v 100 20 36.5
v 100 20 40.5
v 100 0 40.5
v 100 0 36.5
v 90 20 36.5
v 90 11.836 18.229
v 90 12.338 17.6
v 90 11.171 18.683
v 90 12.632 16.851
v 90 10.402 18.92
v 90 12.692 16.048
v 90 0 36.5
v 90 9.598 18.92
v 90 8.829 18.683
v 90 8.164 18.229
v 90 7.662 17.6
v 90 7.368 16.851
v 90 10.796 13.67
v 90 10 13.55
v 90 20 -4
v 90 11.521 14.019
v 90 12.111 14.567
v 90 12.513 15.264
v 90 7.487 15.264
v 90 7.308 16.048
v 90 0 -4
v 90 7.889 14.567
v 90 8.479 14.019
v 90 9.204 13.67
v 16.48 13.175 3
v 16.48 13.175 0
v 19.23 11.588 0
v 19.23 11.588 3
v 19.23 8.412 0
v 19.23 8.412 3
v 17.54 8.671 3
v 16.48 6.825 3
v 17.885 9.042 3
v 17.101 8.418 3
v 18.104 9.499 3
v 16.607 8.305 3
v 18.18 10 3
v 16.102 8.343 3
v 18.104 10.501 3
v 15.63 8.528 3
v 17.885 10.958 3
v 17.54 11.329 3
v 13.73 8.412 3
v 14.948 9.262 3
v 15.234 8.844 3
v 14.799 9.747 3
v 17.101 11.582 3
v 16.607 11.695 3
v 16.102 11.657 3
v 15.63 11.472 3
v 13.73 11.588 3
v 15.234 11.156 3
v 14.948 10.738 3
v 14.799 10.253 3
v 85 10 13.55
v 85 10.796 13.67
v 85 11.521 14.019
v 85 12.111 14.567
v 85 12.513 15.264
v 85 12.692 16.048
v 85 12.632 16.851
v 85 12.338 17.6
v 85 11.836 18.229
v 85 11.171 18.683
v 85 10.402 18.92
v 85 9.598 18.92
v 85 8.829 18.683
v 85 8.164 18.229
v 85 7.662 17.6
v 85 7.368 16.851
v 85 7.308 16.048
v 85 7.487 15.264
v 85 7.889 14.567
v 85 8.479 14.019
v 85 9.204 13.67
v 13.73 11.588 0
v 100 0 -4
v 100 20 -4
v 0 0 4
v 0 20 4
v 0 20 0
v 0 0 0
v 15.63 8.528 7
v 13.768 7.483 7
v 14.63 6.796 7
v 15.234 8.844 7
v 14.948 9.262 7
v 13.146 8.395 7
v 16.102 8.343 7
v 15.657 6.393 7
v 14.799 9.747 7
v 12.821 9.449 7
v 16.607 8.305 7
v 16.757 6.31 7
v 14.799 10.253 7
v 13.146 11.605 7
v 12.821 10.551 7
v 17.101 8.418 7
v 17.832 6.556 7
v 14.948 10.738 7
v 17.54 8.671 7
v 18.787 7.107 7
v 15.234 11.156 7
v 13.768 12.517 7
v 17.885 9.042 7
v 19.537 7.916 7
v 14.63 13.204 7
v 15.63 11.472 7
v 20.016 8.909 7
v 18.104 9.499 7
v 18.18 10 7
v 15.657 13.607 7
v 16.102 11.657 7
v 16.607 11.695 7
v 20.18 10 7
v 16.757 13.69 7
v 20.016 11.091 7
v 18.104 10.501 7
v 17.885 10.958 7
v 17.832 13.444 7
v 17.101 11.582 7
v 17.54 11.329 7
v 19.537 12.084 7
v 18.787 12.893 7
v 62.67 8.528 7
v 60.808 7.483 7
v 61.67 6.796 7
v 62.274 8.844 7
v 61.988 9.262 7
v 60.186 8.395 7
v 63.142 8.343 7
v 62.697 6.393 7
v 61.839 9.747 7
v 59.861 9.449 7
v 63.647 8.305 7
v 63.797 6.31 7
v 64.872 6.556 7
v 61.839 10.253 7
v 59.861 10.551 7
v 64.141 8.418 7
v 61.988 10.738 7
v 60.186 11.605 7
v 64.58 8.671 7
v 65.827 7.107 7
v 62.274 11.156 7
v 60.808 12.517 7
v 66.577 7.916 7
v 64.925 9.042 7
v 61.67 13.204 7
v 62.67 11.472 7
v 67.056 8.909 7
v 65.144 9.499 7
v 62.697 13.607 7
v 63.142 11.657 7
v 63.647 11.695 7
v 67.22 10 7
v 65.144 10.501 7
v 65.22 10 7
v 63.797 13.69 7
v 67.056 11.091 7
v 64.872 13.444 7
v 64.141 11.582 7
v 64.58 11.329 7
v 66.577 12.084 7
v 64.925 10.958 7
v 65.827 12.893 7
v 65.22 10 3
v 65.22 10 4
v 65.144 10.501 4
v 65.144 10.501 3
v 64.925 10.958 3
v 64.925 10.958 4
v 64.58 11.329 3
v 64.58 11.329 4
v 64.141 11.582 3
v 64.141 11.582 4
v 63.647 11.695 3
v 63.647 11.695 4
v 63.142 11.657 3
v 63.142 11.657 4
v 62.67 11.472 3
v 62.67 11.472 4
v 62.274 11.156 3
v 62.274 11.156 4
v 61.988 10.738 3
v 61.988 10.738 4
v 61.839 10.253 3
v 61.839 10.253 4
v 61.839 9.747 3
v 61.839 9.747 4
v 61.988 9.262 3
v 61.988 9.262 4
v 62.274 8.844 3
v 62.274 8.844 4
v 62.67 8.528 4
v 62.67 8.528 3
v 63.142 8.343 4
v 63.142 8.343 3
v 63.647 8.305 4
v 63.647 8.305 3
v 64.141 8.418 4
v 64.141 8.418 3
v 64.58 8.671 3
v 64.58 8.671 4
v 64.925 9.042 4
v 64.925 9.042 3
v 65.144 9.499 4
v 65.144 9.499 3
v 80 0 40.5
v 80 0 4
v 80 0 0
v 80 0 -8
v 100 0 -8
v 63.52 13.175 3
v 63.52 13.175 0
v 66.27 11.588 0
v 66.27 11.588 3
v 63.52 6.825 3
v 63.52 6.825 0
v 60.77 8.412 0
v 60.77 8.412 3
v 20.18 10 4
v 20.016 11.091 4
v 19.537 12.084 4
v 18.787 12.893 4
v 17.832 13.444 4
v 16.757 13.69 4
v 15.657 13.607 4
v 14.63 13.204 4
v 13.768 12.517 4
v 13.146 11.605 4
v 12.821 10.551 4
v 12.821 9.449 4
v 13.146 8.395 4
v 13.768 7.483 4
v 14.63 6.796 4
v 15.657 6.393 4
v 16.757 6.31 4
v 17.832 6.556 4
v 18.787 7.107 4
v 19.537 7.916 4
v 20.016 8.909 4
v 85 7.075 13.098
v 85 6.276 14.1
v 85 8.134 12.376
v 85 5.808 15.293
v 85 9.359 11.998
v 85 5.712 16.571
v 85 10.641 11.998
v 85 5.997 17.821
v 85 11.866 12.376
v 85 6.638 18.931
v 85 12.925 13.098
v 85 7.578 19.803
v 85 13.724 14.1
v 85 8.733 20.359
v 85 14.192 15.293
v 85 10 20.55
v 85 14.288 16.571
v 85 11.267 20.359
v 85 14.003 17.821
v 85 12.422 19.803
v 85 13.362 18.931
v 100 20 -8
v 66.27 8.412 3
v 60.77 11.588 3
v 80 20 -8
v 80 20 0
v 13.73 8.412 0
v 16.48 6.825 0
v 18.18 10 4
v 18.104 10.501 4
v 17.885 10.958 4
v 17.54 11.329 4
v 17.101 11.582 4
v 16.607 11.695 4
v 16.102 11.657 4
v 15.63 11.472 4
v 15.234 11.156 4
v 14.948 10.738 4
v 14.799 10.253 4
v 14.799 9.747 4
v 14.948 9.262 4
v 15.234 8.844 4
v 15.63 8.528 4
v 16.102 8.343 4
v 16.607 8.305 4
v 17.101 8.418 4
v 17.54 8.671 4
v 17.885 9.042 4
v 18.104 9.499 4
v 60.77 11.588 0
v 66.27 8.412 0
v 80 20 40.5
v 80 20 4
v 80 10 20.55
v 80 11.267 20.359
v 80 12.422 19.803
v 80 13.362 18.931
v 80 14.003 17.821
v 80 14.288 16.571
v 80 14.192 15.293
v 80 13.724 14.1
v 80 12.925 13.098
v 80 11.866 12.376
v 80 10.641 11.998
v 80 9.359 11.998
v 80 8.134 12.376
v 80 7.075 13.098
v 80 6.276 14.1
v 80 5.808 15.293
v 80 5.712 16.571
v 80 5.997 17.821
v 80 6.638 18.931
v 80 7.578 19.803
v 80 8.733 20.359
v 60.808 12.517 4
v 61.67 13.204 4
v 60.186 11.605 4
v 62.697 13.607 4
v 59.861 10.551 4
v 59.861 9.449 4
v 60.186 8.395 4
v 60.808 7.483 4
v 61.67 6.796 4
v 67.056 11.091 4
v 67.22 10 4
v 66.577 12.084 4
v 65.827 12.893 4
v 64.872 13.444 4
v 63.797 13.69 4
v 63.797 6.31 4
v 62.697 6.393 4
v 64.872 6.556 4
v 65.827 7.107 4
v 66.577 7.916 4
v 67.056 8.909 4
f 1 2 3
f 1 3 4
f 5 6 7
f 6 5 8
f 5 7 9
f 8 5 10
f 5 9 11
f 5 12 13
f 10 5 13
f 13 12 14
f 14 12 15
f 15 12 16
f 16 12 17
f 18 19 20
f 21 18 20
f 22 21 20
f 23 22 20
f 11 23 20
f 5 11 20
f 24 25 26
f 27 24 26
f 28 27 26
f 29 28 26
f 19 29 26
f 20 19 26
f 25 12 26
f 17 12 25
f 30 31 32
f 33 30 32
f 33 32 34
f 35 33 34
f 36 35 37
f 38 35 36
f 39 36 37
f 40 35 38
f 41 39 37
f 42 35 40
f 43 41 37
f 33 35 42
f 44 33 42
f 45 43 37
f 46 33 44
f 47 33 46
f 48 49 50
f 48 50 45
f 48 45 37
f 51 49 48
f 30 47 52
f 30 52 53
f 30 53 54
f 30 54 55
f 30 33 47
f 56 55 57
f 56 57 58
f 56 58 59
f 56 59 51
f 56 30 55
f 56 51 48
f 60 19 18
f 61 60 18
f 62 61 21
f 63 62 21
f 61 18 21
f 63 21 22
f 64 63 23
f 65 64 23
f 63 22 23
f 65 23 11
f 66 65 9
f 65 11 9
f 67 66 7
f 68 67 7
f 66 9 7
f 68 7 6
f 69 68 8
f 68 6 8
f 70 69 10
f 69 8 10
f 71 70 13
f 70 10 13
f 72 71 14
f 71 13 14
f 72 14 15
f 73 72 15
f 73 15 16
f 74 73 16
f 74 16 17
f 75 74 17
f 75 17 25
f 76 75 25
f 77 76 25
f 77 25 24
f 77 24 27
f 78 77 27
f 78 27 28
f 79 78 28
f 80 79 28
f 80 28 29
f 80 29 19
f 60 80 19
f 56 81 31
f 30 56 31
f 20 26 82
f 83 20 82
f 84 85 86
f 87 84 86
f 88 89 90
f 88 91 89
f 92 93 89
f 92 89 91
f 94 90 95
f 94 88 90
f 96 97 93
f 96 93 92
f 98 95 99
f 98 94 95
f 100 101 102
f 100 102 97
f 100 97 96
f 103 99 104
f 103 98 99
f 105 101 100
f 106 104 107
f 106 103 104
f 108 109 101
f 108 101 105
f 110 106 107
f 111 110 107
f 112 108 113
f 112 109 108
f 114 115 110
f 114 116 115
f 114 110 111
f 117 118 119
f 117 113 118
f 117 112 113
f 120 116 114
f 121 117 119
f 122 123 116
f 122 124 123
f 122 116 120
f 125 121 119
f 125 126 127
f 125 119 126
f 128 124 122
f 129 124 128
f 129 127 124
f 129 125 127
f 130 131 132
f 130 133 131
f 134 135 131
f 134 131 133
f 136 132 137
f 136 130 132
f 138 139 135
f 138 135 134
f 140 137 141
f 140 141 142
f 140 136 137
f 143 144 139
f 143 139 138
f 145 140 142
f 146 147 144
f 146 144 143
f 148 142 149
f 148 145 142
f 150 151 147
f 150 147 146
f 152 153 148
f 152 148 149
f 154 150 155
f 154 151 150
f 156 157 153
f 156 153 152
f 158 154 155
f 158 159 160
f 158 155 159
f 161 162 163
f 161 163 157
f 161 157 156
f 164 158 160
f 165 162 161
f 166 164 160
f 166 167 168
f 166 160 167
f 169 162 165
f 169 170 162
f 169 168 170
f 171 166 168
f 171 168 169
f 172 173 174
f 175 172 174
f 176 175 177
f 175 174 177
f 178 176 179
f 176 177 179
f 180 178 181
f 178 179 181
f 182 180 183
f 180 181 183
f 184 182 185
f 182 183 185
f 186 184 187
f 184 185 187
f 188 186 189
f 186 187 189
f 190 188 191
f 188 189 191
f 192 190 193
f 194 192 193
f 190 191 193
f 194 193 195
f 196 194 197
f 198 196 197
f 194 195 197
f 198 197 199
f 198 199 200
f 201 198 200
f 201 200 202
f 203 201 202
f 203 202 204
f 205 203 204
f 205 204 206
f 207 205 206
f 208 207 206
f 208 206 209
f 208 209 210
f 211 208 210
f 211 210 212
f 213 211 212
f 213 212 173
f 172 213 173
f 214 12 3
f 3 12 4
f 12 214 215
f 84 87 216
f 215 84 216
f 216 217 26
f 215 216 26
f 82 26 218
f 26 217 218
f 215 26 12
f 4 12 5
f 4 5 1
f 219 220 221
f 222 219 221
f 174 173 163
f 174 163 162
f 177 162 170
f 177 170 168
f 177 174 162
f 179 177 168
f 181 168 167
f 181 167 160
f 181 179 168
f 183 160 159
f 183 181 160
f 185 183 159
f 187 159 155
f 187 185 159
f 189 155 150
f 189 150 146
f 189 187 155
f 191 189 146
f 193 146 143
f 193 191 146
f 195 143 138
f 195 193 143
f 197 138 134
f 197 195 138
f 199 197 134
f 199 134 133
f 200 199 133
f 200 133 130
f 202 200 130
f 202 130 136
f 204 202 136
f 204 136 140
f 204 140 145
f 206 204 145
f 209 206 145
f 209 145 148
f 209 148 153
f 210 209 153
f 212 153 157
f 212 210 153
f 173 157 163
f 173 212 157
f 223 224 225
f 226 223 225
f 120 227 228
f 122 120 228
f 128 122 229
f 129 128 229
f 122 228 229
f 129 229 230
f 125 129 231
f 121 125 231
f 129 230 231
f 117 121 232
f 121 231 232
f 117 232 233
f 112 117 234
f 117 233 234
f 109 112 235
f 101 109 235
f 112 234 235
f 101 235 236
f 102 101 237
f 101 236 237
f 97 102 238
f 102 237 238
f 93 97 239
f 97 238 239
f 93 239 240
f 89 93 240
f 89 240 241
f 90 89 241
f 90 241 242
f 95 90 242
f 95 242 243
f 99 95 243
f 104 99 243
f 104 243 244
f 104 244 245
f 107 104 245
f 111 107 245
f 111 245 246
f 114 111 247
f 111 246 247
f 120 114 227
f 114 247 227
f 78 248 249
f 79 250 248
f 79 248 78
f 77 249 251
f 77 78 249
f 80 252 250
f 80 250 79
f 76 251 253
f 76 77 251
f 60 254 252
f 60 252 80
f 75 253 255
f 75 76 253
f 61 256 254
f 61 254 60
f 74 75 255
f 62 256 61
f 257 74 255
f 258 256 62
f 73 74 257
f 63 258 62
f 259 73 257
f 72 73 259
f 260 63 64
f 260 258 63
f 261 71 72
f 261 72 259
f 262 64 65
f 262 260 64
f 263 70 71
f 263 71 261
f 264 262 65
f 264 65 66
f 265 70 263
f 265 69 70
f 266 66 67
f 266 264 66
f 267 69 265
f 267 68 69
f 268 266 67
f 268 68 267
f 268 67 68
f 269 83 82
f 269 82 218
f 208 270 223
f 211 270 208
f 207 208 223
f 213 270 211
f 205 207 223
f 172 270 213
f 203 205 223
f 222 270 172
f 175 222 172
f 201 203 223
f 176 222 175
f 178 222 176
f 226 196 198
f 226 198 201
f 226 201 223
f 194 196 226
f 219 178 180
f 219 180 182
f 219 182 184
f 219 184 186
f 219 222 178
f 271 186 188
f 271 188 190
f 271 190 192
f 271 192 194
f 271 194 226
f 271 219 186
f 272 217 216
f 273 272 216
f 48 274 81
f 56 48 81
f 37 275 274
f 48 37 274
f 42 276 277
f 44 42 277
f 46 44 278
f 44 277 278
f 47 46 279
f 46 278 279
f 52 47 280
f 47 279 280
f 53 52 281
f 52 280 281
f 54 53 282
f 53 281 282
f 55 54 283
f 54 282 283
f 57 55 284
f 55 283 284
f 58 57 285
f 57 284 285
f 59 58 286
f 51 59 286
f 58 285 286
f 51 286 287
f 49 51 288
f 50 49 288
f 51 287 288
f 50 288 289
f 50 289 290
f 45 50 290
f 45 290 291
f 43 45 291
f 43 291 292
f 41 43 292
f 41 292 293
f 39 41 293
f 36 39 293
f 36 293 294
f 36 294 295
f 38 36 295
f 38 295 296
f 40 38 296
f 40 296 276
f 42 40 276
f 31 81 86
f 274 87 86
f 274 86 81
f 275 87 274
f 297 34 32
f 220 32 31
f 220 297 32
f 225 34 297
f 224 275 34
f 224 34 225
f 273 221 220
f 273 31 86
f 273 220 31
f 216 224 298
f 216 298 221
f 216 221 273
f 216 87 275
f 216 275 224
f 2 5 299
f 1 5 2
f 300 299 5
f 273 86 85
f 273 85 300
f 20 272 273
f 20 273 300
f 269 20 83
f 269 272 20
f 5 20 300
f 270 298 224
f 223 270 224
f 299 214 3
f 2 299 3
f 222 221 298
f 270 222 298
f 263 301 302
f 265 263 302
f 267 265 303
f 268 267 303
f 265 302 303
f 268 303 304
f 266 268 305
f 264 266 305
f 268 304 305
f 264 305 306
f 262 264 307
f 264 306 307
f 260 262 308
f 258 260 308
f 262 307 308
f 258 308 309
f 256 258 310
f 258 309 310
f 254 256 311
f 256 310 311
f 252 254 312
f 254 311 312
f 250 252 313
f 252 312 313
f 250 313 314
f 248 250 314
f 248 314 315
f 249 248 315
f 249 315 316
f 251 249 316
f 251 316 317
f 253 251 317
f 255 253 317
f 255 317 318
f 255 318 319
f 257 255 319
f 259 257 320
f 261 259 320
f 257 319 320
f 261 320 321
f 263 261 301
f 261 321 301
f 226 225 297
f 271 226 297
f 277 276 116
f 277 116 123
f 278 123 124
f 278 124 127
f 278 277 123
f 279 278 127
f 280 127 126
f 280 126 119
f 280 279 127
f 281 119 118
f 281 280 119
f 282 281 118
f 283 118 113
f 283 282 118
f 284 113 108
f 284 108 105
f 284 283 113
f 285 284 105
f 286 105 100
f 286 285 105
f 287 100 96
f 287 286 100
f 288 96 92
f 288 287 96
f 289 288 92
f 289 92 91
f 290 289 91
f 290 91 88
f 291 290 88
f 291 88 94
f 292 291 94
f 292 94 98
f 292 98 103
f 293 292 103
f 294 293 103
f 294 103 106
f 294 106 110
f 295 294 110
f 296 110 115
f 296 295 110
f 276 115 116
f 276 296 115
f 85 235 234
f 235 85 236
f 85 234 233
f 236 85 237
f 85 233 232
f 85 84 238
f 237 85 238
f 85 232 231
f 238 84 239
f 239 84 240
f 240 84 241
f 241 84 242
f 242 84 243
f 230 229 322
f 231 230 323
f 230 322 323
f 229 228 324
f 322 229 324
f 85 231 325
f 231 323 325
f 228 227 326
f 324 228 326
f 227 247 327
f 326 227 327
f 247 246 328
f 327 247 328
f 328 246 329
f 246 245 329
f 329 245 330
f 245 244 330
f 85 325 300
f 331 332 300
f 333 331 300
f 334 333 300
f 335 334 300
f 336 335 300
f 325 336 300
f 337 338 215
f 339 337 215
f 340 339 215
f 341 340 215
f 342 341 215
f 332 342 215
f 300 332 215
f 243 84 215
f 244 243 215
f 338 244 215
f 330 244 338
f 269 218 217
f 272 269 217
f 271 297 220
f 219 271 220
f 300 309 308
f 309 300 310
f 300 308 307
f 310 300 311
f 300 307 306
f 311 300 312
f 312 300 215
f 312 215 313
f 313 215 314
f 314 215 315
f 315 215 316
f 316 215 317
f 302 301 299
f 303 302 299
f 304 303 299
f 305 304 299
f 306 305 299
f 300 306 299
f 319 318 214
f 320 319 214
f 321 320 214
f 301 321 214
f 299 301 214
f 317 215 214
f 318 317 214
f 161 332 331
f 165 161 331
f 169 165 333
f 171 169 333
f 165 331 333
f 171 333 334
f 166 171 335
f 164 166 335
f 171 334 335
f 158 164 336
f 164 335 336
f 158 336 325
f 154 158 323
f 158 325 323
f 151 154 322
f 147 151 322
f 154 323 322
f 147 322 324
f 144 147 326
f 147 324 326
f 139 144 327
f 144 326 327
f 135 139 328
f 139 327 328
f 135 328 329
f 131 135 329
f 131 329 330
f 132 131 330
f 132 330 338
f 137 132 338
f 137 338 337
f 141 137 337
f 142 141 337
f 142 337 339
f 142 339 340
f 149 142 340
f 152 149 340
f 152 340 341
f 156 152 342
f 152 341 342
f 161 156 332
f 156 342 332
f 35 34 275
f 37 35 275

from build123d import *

# Parameters (mm, degrees)
SKETCH1_W           = 80
SKETCH1_H           = 4
SKETCH1_W_2         = 10
BOSS_EXTRUDE1_DEPTH = 20
CUT_EXTRUDE2_REACH  = 92
SKETCH2_R           = 2.7
CUT_EXTRUDE3_REACH  = 14
SKETCH4_R           = 1.7
SKETCH5_R           = 3.7
SKETCH5_R_2         = 1.7
BOSS_EXTRUDE2_DEPTH = 3
SKETCH6_R           = 4.3
CUT_EXTRUDE4_DEPTH  = 5
CUT_EXTRUDE5_DEPTH  = 3


with BuildPart() as part:
    # Sketch1 → Boss-Extrude1 (new body)
    with BuildSketch(Plane(origin=(0, 0, 0), x_dir=(1, 0, 0), z_dir=(0, 1, 0))):
        with Locations((40, -2)):
            Rectangle(SKETCH1_W, SKETCH1_H)
        Polygon((80, 8), (80, 0), (80, -4), (80, -40.5), (90, -40.5), (90, -36.5), (90, 4), (90, 8), align=None)
        with Locations((95, 6)):
            Rectangle(SKETCH1_W_2, SKETCH1_H)
        with Locations((95, -38.5)):
            Rectangle(SKETCH1_W_2, SKETCH1_H)
    extrude(amount=BOSS_EXTRUDE1_DEPTH)

    # Sketch2 → Cut-Extrude2 (cut, up to next)
    with BuildSketch(Plane(origin=(90, 0, 0), x_dir=(0, 0, -1), z_dir=(1, 0, 0)), mode=Mode.PRIVATE) as cut_extrude2_sk1:
        with Locations((-16.25, 10)):
            Circle(SKETCH2_R)
    cut_extrude2_tool1 = extrude(cut_extrude2_sk1.sketch, amount=-CUT_EXTRUDE2_REACH, mode=Mode.PRIVATE) & part.part
    add(cut_extrude2_tool1.solids().sort_by_distance((90, 10, 16.25))[0], mode=Mode.SUBTRACT)

    # Sketch4 → Cut-Extrude3 (cut, up to next)
    with BuildSketch(Plane.XY.offset(4), mode=Mode.PRIVATE) as cut_extrude3_sk1:
        with Locations((16.48, 10)):
            Circle(SKETCH4_R)
    cut_extrude3_tool1 = extrude(cut_extrude3_sk1.sketch, amount=-CUT_EXTRUDE3_REACH, mode=Mode.PRIVATE) & part.part
    add(cut_extrude3_tool1.solids().sort_by_distance((16.48, 10, 4))[0], mode=Mode.SUBTRACT)
    # Sketch4 → Cut-Extrude3 (cut, up to next)
    with BuildSketch(Plane.XY.offset(4), mode=Mode.PRIVATE) as cut_extrude3_sk2:
        with Locations((63.52, 10)):
            Circle(SKETCH4_R)
    cut_extrude3_tool2 = extrude(cut_extrude3_sk2.sketch, amount=-CUT_EXTRUDE3_REACH, mode=Mode.PRIVATE) & part.part
    add(cut_extrude3_tool2.solids().sort_by_distance((63.52, 10, 4))[0], mode=Mode.SUBTRACT)

    # Sketch5 → Boss-Extrude2 (add)
    with BuildSketch(Plane.XY.offset(4)):
        with Locations((16.48, 10)):
            Circle(SKETCH5_R)
        with Locations((16.48, 10)):
            Circle(SKETCH5_R_2, mode=Mode.SUBTRACT)
        with Locations((63.52, 10)):
            Circle(SKETCH5_R)
        with Locations((63.52, 10)):
            Circle(SKETCH5_R_2, mode=Mode.SUBTRACT)
    extrude(amount=BOSS_EXTRUDE2_DEPTH)

    # Sketch6 → Cut-Extrude4 (cut)
    with BuildSketch(Plane.ZY.offset(-80)):
        with Locations((16.25, 10)):
            Circle(SKETCH6_R)
    extrude(amount=-CUT_EXTRUDE4_DEPTH, mode=Mode.SUBTRACT)

    # Sketch7 → Cut-Extrude5 (cut)
    with BuildSketch(Plane(origin=(0, 0, 0), x_dir=(-1, 0, 0), z_dir=(0, 0, -1))):
        Polygon((-60.77, 8.41228676), (-60.77, 11.58771324), (-63.52, 13.175426481), (-66.27, 11.58771324), (-66.27, 8.41228676), (-63.52, 6.824573519), align=None)
        Polygon((-13.73, 8.41228676), (-13.73, 11.58771324), (-16.48, 13.175426481), (-19.23, 11.58771324), (-19.23, 8.41228676), (-16.48, 6.824573519), align=None)
    extrude(amount=-CUT_EXTRUDE5_DEPTH, mode=Mode.SUBTRACT)


solid = part.part
